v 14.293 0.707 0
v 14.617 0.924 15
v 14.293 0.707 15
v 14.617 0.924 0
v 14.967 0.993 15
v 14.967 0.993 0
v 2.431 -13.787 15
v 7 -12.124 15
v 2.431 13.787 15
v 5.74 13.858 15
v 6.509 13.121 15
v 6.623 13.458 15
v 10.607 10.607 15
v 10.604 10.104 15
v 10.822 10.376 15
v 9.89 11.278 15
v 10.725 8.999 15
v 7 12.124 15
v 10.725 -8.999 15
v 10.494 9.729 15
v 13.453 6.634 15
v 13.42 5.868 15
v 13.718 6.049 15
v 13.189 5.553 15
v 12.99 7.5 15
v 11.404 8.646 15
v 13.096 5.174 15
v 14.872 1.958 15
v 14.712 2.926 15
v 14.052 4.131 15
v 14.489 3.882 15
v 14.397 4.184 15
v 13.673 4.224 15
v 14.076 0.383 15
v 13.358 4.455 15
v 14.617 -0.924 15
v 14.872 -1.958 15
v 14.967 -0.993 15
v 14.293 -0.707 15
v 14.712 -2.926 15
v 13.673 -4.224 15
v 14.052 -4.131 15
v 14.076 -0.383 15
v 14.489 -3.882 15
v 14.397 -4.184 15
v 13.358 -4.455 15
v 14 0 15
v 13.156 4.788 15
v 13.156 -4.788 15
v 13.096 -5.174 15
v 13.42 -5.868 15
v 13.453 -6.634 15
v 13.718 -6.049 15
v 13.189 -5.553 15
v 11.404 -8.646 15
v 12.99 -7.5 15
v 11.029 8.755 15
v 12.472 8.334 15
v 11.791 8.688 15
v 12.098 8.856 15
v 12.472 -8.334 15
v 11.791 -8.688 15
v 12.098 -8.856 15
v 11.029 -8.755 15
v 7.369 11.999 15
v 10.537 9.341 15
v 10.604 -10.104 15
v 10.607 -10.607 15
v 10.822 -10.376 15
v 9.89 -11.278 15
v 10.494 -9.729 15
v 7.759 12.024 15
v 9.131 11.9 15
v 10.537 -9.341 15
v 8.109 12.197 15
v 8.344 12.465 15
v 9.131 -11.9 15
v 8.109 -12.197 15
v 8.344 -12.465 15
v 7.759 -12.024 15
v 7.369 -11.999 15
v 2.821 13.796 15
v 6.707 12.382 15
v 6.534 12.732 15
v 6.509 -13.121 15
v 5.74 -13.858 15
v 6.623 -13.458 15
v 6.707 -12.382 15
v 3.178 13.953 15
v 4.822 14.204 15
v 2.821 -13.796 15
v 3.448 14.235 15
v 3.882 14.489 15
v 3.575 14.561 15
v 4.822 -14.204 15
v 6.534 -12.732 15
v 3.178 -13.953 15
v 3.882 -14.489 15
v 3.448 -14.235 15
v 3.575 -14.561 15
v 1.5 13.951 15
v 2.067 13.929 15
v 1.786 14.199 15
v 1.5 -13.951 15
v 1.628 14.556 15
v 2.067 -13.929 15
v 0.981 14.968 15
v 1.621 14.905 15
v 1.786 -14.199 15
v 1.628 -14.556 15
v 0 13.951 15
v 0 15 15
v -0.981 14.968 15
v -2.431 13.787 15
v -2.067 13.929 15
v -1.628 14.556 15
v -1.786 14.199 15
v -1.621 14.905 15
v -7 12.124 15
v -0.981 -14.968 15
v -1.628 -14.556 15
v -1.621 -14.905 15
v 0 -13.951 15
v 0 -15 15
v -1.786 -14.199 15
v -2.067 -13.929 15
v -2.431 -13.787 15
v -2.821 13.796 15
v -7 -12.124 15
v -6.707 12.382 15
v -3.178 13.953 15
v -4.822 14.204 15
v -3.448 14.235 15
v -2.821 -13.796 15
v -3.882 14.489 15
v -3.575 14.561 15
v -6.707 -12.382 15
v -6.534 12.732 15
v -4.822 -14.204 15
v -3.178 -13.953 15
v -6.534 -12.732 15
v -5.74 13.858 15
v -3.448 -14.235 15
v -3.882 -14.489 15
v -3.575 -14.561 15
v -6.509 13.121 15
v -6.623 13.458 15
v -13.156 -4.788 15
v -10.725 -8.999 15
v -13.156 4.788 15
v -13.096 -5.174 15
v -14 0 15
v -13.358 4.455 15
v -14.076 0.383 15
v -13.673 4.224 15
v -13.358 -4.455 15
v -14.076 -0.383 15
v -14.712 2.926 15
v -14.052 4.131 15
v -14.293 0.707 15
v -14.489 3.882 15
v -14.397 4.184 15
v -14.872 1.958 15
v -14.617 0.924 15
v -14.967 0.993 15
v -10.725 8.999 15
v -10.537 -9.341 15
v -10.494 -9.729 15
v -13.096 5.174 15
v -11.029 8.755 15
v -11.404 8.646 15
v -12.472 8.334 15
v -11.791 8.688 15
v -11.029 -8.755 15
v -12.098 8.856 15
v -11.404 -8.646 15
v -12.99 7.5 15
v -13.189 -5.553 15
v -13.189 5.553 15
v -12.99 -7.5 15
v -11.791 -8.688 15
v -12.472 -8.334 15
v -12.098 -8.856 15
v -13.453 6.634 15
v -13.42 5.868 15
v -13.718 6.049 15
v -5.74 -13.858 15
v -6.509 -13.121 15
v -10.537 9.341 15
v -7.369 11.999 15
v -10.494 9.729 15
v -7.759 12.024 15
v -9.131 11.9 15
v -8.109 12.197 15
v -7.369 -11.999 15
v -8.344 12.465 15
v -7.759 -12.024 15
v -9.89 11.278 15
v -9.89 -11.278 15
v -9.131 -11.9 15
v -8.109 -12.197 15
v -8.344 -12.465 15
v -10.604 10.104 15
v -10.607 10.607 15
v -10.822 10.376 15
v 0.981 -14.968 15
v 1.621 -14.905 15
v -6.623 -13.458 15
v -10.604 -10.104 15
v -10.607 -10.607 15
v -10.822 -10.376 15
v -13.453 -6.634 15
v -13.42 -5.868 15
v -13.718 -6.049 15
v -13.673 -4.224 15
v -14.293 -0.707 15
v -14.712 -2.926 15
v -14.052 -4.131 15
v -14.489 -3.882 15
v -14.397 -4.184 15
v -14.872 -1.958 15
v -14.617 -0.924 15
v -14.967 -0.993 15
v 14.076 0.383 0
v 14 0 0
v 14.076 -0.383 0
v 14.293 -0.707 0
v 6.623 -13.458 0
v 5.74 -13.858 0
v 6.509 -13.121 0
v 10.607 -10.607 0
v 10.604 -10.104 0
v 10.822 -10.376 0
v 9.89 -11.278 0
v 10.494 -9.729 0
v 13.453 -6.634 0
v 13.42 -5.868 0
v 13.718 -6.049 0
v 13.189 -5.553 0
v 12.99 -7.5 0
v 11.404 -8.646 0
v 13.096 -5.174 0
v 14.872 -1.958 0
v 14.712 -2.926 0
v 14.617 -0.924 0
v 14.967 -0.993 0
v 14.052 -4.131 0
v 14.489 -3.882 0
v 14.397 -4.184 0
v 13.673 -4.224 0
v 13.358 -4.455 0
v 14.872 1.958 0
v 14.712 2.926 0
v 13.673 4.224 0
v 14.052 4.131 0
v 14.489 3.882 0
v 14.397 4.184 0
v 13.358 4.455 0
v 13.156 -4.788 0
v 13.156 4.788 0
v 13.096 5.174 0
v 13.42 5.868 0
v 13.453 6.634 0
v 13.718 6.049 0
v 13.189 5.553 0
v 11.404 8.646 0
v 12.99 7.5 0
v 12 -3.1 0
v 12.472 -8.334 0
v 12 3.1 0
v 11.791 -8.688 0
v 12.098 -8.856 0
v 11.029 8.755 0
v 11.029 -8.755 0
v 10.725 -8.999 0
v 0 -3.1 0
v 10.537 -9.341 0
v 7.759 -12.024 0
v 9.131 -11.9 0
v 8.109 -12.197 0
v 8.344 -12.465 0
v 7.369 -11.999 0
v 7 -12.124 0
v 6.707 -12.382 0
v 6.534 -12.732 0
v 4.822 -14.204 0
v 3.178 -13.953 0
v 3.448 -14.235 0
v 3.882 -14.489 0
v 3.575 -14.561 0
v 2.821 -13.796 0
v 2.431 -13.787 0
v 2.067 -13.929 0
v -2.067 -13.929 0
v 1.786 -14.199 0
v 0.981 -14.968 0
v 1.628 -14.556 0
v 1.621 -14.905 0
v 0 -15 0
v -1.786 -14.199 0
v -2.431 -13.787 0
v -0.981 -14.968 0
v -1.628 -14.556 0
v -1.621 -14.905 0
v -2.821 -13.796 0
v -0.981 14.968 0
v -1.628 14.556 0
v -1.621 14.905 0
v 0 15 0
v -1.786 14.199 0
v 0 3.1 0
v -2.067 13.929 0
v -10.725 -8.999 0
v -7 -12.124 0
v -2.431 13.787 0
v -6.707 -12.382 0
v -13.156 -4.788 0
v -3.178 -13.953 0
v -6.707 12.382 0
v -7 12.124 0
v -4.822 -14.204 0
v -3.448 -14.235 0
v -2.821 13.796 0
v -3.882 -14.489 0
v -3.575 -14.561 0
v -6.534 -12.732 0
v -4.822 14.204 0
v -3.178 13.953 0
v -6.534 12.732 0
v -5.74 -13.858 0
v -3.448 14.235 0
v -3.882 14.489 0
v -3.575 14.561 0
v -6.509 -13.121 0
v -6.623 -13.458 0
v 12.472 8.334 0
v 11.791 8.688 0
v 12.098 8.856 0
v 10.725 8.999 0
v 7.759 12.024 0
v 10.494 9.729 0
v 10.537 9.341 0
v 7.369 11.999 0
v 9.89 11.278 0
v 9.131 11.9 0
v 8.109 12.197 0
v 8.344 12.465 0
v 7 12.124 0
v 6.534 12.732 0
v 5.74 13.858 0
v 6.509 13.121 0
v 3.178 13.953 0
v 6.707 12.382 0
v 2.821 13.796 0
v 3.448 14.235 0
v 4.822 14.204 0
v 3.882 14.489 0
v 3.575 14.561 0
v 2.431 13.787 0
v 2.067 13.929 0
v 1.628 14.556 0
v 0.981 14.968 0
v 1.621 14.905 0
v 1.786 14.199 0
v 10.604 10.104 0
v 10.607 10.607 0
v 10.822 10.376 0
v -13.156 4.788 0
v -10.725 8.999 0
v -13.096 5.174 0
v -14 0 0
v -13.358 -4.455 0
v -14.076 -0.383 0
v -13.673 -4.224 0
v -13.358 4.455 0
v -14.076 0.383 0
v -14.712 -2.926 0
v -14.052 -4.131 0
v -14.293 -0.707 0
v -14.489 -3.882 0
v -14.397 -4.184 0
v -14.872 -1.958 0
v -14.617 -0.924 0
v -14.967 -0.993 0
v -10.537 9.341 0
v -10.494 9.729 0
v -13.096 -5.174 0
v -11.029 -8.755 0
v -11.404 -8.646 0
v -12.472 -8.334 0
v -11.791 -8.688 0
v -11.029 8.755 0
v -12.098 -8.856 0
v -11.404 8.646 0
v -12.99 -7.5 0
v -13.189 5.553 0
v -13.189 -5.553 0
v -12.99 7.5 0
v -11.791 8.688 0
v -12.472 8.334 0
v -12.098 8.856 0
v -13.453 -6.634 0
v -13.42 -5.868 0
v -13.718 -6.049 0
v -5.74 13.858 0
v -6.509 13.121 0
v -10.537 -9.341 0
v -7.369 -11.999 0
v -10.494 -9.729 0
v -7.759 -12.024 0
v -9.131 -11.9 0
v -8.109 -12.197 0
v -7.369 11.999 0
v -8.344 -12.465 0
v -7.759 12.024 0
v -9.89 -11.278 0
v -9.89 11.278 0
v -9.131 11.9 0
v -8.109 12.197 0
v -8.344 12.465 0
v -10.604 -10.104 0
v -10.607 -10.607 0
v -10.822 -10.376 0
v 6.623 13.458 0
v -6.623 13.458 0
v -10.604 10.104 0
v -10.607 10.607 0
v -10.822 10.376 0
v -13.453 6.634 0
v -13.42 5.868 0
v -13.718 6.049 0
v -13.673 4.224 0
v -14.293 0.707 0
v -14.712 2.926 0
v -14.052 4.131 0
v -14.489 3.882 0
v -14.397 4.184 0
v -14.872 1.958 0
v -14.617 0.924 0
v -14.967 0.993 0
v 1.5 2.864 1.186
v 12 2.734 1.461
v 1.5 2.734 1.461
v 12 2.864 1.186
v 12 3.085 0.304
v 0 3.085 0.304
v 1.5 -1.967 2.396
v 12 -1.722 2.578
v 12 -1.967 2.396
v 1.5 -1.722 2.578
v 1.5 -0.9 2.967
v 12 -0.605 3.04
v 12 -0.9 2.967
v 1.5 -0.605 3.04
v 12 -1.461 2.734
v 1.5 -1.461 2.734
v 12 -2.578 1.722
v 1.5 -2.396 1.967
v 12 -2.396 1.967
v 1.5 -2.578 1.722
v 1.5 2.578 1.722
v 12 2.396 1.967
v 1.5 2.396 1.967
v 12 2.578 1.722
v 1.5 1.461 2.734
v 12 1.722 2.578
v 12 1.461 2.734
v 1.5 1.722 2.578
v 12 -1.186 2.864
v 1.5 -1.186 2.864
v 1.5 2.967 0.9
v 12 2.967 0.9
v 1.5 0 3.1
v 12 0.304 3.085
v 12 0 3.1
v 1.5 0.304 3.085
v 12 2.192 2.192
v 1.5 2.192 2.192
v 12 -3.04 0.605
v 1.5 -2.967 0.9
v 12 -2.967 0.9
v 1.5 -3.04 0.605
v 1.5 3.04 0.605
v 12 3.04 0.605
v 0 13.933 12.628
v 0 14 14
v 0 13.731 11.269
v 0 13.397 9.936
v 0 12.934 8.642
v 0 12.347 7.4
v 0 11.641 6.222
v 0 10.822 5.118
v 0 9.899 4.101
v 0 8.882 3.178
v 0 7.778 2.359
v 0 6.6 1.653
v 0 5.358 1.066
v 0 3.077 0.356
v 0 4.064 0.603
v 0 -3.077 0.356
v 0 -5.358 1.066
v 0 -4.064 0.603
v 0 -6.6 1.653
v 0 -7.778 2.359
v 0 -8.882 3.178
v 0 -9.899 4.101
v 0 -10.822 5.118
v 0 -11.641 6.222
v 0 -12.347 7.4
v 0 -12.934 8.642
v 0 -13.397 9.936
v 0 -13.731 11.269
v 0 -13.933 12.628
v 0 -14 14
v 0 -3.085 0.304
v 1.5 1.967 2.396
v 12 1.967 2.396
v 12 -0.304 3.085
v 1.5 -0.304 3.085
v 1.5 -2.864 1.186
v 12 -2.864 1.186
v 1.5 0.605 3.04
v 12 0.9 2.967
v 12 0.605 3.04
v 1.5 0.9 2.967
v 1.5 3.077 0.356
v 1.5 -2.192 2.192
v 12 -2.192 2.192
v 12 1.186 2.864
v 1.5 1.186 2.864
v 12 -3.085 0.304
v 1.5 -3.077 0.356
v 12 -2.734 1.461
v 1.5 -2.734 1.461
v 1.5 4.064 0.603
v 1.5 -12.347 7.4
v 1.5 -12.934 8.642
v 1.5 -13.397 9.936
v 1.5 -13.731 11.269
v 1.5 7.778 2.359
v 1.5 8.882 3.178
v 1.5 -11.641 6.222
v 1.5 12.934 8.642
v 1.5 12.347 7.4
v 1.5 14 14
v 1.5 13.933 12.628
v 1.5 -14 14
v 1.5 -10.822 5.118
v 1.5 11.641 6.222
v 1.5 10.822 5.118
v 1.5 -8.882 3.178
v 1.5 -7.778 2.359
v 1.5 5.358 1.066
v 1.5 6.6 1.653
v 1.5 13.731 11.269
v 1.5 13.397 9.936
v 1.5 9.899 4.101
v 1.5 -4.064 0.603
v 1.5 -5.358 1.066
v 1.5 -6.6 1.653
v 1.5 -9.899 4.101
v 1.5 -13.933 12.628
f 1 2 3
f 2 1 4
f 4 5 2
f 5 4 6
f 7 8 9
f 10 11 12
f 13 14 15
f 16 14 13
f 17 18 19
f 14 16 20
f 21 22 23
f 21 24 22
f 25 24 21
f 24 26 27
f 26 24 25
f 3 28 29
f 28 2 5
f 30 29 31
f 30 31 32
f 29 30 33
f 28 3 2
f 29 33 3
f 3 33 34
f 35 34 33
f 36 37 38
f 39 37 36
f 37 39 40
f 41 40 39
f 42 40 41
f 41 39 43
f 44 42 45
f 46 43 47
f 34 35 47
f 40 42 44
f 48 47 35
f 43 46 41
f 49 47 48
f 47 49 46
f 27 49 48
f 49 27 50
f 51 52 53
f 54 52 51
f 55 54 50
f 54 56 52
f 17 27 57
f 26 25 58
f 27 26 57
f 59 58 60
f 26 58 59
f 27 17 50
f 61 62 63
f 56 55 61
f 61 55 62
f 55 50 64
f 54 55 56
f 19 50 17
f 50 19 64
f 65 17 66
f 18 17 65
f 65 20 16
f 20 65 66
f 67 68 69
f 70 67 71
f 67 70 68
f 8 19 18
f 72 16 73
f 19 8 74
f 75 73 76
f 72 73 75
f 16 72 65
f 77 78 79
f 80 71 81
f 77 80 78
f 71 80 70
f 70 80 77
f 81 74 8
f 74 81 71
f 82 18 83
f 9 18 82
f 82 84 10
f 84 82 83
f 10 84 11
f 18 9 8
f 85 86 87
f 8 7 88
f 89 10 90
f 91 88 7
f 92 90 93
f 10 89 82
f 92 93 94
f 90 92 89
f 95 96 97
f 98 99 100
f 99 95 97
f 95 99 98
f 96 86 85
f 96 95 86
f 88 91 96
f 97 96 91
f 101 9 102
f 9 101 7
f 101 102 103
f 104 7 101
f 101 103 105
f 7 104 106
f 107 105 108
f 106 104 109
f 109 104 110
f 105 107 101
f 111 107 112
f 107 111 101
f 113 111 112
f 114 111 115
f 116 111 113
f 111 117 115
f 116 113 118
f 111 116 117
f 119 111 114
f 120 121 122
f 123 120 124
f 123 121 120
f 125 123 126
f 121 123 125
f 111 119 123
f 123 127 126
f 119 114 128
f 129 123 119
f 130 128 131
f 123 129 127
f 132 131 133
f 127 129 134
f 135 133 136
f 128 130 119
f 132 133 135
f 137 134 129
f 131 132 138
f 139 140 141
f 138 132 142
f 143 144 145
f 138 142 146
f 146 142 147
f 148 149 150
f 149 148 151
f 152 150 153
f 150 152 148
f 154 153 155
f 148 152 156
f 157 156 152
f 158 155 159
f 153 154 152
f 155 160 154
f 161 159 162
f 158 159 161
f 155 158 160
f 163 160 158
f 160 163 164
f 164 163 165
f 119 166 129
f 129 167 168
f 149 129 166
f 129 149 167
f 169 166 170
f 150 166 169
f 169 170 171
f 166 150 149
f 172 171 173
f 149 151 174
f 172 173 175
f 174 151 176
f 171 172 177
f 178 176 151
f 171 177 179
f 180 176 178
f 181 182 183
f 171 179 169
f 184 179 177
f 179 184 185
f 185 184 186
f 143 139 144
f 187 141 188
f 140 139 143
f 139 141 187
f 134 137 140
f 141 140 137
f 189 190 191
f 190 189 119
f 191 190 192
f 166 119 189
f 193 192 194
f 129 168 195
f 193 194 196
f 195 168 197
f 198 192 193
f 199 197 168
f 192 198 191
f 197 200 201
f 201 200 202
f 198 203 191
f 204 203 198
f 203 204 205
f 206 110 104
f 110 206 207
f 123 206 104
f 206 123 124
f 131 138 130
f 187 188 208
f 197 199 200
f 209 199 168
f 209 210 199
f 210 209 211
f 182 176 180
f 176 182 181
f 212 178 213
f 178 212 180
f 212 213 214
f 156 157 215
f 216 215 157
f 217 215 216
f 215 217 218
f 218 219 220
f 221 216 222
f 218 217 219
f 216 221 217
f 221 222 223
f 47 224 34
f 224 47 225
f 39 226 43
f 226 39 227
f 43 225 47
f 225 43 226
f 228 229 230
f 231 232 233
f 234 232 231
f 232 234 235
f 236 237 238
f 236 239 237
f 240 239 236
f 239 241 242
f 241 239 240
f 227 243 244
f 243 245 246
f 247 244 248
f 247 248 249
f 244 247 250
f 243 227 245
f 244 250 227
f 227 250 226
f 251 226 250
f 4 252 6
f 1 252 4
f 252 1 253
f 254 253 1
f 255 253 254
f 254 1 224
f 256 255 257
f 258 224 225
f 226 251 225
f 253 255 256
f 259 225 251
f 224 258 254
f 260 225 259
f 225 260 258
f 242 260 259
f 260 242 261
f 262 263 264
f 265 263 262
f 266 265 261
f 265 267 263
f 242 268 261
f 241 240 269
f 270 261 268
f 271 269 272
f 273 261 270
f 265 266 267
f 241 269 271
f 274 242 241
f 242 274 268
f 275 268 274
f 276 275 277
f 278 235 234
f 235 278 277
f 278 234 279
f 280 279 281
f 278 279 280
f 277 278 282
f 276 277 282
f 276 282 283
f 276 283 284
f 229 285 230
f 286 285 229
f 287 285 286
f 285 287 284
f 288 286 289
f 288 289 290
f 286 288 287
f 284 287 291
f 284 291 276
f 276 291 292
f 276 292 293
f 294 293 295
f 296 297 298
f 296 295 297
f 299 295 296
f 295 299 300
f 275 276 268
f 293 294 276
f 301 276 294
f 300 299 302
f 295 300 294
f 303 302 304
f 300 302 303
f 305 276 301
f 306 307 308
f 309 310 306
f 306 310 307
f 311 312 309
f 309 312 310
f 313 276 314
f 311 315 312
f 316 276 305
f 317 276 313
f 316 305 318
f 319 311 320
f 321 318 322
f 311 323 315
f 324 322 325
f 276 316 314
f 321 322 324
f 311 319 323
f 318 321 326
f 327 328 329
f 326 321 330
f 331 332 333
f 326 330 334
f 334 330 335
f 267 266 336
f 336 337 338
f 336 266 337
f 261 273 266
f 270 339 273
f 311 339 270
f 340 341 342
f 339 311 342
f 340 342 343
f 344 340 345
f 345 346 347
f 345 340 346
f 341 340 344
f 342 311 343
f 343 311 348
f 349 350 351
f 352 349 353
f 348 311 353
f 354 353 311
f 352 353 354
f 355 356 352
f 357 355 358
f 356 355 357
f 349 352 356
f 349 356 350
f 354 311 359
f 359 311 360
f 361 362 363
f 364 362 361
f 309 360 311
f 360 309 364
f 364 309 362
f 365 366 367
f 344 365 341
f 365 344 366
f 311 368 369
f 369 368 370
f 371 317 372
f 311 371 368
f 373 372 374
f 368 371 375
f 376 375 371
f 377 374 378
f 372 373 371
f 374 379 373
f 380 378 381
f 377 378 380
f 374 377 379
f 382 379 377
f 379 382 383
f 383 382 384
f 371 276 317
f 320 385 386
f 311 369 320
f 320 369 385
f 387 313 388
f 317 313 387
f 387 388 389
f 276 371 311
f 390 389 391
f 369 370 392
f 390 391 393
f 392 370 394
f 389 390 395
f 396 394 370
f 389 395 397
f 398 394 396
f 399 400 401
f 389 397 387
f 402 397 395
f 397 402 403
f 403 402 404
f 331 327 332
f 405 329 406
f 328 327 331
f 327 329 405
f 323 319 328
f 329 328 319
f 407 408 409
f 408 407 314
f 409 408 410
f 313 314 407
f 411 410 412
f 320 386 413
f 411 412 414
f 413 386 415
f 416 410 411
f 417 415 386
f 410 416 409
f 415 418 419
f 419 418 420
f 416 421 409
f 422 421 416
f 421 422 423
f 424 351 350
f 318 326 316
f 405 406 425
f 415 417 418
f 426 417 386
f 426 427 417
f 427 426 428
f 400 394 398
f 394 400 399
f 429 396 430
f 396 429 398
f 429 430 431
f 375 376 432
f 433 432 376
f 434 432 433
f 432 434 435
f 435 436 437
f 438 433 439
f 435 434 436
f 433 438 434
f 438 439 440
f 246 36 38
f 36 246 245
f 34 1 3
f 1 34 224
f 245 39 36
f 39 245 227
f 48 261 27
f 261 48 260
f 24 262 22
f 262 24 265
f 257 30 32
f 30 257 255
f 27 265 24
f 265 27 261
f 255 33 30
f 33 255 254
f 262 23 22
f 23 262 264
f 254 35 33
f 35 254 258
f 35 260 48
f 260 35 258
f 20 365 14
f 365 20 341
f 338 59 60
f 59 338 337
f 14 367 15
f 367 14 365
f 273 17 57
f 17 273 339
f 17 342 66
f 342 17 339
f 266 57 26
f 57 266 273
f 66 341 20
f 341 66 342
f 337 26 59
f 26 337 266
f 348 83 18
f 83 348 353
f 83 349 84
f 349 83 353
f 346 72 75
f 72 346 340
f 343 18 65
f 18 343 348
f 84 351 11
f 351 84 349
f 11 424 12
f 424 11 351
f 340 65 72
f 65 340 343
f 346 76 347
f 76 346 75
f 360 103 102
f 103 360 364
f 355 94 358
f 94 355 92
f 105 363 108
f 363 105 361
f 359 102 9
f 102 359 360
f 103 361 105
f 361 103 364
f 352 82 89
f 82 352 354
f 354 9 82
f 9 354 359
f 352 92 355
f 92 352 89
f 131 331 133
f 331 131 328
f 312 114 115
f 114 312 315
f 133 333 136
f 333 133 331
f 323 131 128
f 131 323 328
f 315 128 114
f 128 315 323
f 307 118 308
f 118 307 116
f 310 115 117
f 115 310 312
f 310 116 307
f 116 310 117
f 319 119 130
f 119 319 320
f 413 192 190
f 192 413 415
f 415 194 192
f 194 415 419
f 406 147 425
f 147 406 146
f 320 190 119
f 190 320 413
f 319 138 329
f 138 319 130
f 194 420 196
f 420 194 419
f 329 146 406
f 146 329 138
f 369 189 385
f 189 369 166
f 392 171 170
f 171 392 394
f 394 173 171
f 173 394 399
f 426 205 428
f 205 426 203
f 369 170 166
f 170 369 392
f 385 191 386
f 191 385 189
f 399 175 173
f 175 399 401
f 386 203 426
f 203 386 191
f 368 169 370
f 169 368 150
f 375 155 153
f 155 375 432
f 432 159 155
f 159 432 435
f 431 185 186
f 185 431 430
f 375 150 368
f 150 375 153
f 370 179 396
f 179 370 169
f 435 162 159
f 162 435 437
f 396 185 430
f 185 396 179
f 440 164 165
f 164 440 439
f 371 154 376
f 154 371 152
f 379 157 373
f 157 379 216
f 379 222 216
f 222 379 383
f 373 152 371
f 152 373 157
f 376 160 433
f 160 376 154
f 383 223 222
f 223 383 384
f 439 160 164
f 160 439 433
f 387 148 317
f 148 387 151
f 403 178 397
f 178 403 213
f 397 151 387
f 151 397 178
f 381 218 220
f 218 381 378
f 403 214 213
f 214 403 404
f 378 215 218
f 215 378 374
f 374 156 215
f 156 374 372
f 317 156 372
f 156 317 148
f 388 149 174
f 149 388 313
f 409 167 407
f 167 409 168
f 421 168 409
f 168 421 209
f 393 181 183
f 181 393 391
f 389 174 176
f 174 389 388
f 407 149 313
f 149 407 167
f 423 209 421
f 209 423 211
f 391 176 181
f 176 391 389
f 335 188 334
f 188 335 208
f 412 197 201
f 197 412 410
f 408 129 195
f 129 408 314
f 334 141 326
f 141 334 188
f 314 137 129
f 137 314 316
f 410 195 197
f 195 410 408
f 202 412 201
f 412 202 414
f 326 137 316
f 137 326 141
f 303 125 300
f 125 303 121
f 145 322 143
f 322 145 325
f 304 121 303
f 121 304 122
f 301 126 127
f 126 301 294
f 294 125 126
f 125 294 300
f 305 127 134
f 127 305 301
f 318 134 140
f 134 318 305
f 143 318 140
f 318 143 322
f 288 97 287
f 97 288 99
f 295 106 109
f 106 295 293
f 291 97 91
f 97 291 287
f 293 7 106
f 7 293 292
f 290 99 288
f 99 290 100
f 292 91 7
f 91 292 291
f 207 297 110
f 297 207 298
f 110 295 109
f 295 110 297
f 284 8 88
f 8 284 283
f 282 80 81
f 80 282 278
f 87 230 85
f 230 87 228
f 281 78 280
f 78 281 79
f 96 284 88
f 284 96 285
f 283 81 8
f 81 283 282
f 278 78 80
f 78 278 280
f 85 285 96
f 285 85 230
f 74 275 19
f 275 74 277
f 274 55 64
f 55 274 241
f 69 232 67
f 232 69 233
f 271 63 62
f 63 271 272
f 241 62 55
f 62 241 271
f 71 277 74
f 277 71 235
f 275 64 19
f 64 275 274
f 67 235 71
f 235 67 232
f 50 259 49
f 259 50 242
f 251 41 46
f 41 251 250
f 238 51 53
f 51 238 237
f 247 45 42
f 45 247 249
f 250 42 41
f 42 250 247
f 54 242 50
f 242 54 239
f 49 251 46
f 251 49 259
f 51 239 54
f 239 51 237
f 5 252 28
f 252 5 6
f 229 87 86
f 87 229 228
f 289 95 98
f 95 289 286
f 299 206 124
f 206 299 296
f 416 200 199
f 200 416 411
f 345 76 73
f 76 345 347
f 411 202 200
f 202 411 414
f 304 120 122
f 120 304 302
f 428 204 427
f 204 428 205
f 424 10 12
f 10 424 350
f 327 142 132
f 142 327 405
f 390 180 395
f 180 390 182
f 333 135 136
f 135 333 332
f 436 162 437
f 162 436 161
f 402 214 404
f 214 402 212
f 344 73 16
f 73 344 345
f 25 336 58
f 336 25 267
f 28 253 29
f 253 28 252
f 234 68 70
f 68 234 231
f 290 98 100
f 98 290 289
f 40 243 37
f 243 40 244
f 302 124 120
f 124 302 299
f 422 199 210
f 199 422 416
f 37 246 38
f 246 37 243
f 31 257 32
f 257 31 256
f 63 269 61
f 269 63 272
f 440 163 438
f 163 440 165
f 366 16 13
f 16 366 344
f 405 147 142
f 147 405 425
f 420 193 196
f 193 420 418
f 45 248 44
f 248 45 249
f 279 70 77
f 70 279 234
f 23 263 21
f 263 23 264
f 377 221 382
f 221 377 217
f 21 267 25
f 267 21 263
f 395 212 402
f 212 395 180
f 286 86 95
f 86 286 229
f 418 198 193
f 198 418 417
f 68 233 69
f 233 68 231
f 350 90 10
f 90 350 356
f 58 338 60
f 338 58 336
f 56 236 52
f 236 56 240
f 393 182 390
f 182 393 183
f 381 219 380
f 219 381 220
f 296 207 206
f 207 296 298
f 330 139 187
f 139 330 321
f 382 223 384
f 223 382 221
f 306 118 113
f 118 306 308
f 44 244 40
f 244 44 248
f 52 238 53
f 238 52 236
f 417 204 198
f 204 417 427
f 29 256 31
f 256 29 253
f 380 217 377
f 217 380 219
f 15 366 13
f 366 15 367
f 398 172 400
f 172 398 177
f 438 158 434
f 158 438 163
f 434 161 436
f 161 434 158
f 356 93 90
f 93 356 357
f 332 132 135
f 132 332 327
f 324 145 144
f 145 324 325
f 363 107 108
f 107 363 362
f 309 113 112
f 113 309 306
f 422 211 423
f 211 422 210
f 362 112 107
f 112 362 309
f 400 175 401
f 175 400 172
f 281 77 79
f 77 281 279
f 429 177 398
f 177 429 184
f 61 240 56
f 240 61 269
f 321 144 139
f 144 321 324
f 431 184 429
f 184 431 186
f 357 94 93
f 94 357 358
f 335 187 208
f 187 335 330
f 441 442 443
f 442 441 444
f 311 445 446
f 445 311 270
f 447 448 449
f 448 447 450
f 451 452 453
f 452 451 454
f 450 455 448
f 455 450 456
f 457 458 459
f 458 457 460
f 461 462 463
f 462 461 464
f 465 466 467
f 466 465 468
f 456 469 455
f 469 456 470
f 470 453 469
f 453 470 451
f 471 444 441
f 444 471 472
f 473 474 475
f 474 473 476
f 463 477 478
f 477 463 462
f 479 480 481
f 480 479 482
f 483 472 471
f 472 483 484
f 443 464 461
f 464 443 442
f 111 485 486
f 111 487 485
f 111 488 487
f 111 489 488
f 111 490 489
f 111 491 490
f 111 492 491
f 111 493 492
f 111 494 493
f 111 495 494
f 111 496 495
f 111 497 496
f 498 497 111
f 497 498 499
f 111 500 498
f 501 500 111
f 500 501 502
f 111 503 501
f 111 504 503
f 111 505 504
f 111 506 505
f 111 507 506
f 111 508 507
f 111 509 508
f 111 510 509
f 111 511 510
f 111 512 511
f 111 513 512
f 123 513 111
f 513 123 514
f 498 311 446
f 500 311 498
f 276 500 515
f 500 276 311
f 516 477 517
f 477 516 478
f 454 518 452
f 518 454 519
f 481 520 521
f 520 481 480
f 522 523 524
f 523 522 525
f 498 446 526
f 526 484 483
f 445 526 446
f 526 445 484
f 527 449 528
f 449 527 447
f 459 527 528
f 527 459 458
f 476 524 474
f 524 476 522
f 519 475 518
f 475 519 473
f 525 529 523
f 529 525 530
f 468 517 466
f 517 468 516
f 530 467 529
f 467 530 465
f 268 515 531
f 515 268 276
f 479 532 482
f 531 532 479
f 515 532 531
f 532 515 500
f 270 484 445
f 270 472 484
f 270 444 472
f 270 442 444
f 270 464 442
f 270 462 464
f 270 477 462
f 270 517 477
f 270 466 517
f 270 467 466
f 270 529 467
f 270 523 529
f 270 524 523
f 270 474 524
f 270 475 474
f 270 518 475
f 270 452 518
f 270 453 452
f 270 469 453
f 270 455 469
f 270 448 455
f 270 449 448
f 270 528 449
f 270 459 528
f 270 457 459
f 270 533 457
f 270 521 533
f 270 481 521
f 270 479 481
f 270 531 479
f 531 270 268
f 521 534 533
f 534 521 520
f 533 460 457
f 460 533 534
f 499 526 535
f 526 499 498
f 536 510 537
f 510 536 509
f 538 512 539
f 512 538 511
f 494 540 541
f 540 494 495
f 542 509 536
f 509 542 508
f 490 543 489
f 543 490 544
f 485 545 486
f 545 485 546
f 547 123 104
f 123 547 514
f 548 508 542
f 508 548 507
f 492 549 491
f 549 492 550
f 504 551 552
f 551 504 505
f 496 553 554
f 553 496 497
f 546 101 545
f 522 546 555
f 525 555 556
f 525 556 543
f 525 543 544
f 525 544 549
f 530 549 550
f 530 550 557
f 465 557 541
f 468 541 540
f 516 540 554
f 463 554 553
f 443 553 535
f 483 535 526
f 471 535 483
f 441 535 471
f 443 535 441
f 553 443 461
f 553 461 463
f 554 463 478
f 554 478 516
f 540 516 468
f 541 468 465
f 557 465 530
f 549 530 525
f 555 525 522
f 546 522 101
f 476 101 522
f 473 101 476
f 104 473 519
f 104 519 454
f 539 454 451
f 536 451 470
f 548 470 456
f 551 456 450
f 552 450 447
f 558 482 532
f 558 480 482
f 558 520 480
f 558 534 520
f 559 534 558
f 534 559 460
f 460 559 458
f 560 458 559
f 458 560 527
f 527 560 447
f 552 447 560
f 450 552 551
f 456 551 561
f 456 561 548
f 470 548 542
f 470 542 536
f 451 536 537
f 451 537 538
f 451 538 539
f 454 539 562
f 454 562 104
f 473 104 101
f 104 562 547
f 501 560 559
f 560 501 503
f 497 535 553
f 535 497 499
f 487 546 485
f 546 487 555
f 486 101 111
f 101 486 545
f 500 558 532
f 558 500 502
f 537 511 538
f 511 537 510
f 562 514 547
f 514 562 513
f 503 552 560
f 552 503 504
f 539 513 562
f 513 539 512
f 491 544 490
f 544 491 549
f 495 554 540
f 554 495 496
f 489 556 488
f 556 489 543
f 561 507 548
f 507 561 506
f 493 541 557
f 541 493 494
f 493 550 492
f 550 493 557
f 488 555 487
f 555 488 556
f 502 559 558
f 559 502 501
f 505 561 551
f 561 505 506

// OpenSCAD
// Hotplate stirrer knob - D-shaft knob with grip grooves and a pointer groove, printed
// with the D-flat side down on the bed. NOVEL general part.
//

shaft_d   = 6;
knob_d    = 30;
knob_h    = 15;
bore_len  = 12;
bore_d    = 6.2;
bore_flat = 4.7;
grooves   = 18;
groove_d  = 2;
pointer_w = 1.5;
pointer_d = 1;

$fn = 96;

difference() {
    cylinder(h = knob_h, d = knob_d);
    translate([0, 0, 0])
        rotate([0, 90, 0])
            cylinder(h = bore_len, d = bore_d, $fn = 64);
    for (i = [0 : grooves - 1])
        rotate([0, 0, i * 360 / grooves])
            translate([knob_d / 2, 0, 0])
                cylinder(h = knob_h, d = groove_d, $fn = 16);
    translate([0, 0, knob_h - pointer_d])
        rotate([0, 90, 0])
            cylinder(h = pointer_w, d = knob_d - 2 * pointer_d, $fn = 64);
}
